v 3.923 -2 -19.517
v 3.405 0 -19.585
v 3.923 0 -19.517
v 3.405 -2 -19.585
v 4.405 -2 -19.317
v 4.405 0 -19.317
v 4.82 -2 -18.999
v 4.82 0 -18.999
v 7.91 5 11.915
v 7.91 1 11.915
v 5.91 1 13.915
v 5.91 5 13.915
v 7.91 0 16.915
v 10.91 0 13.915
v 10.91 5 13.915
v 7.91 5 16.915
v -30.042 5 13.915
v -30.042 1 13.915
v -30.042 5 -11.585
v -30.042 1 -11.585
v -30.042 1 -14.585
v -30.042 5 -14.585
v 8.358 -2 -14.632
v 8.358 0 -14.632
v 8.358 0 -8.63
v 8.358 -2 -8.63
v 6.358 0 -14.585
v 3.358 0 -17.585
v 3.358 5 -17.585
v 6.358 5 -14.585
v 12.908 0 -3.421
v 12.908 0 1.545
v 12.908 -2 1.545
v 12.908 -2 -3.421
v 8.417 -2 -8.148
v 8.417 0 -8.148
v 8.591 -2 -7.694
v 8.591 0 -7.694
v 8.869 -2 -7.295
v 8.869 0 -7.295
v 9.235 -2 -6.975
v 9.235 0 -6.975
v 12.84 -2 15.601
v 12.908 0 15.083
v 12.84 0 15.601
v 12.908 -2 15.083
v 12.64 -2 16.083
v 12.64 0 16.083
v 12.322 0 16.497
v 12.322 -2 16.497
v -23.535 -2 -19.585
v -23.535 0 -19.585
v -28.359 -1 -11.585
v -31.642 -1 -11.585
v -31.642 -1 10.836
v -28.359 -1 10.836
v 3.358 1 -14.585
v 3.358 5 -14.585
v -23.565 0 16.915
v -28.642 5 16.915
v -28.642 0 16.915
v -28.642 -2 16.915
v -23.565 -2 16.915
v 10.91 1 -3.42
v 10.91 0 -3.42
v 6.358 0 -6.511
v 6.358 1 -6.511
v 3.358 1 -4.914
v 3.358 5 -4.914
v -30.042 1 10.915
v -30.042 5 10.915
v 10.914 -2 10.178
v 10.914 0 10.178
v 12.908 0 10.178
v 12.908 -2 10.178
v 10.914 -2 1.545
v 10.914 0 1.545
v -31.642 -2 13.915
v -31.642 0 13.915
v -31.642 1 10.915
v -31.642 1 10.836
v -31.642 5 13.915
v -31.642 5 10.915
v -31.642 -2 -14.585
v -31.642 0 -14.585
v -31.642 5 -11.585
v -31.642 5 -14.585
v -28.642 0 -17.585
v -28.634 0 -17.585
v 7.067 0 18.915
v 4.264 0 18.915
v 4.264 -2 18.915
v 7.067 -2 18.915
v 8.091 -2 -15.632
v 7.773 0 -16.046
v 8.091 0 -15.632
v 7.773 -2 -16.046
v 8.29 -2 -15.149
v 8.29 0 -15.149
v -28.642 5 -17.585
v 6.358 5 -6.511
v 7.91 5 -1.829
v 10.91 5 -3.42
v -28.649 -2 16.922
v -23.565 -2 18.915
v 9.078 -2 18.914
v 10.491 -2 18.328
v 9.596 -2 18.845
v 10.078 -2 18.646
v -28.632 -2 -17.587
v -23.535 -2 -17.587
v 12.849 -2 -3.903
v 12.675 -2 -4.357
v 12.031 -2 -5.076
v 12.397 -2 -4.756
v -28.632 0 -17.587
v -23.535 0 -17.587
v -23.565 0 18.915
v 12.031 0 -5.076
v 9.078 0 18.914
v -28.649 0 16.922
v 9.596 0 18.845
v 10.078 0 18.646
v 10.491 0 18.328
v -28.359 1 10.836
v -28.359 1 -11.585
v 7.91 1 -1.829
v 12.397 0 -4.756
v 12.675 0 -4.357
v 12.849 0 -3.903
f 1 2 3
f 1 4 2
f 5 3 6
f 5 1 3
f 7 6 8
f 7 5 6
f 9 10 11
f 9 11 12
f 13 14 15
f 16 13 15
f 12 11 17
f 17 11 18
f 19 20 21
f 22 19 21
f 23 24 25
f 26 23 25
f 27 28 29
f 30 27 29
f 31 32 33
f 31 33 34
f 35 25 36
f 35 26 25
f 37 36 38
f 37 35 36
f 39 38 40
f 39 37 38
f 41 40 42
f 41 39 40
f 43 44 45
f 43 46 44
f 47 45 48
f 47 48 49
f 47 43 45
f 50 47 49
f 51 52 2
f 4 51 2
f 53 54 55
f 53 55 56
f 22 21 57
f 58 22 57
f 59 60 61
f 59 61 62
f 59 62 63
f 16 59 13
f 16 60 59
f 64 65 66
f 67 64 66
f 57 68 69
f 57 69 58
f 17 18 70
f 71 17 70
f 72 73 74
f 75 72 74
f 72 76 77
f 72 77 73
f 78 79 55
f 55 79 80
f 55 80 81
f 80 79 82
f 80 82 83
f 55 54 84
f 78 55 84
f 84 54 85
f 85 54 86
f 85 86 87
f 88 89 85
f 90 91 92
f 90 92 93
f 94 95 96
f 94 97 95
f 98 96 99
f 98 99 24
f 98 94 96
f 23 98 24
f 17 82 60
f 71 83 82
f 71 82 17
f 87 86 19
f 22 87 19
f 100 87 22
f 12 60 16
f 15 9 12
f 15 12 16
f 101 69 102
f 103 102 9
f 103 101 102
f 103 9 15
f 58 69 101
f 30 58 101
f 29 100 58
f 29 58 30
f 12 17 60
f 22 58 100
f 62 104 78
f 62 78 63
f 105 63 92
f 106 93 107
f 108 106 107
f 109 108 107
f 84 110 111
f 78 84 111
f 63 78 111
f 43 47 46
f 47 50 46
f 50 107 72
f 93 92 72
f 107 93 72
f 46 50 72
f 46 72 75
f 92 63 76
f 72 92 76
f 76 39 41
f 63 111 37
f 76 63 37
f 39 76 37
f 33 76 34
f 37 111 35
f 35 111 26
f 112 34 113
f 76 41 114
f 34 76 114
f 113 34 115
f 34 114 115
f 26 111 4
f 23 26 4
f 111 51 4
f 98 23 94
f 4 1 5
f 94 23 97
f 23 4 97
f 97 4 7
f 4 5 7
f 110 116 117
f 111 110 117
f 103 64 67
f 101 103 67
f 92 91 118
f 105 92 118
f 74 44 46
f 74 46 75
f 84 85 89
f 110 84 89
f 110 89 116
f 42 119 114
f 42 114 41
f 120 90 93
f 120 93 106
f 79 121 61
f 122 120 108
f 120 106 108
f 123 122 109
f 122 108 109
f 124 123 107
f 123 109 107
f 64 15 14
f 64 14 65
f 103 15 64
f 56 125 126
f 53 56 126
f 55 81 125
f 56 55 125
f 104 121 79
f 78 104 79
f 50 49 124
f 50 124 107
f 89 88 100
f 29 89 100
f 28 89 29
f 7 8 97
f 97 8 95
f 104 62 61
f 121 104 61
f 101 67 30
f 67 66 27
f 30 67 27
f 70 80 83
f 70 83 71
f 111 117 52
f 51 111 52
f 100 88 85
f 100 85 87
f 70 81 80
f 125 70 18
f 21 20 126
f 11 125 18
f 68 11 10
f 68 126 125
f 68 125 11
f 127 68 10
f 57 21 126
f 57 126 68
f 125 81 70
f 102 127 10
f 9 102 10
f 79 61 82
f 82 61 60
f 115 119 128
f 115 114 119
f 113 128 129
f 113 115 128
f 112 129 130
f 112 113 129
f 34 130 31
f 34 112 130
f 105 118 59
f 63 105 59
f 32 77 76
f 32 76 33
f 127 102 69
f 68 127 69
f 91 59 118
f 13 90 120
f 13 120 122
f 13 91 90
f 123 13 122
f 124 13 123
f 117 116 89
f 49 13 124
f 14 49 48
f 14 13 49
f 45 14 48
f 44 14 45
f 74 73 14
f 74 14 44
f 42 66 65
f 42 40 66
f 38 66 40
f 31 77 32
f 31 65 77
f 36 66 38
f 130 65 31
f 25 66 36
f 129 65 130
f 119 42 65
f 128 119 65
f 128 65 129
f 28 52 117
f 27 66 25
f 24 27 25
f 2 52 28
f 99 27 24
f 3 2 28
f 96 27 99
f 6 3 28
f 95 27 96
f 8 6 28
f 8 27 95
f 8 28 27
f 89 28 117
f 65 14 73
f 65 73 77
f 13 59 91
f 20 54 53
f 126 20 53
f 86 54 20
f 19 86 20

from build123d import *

# Parameters (mm, degrees)
SKETCH1_W               = 41
SKETCH1_H               = 34.5
SKETCH1_W_2             = 35
SKETCH1_H_2             = 28.5
BOSS_EXTRUDE1_DEPTH     = 5
SKETCH2_W               = 35
SKETCH2_H               = 28.5
BOSS_EXTRUDE2_DEPTH     = 1
SKETCH6_W               = 34.5
SKETCH6_H               = 5
CUT_EXTRUDE2_DEPTH      = 3
SKETCH7_W               = 1.6
SKETCH7_H               = 3
BOSS_EXTRUDE3_DEPTH     = 4
CHAMFER1_SIZE           = 3
SKETCH14_W              = 3.502632447
SKETCH14_H              = 20.452559449
CUT_EXTRUDE6_DEPTH      = 10
BOSS_EXTRUDE5_DEPTH     = 4
BOSS_EXTRUDE7_DEPTH     = 1
SKETCH9_W               = 3.28281374
SKETCH9_H               = 22.420706044
CUT_EXTRUDE3_DEPTH      = 4
BOSS_EXTRUDE4_DEPTH     = 2
SKETCH12_W              = 3.28281374
SKETCH12_H              = 22.420706044
CUT_EXTRUDE4_DEPTH      = 1
BOSS_EXTRUDE8_DEPTH     = 2
BOSS_EXTRUDE9_DEPTH     = 2
CUT_EXTRUDE7_DEPTH      = 1
CUT_EXTRUDE7_DEPTH_BACK = 4
CHAMFER2_SIZE           = 3
CHAMFER2_EDGE_2_SIZE2   = 3
CHAMFER2_EDGE_2_SIZE    = 3.001586398
CHAMFER3_SIZE           = 2
CUT_EXTRUDE8_DEPTH      = 10
SKETCH29_W              = 2.811538377
SKETCH29_H              = 2
CUT_EXTRUDE9_DEPTH      = 10
SKETCH31_W              = 5.26
SKETCH31_H              = 2
CUT_EXTRUDE10_DEPTH     = 10
SKETCH33_W              = 1.99335007
SKETCH33_H              = 8.633384354
CUT_EXTRUDE11_DEPTH     = 10
FILLET1_R               = 2


with BuildPart() as part:
    # Sketch1 → Boss-Extrude1 (new body)
    with BuildSketch(Plane(origin=(0, 0, 0), x_dir=(1, 0, 0), z_dir=(0, 1, 0))):
        with Locations((-14.14154724, 0.334775681)):
            Rectangle(SKETCH1_W, SKETCH1_H)
        with Locations((-14.14154724, 0.334775681)):
            Rectangle(SKETCH1_W_2, SKETCH1_H_2, mode=Mode.SUBTRACT)
    extrude(amount=BOSS_EXTRUDE1_DEPTH)

    # Sketch2 → Boss-Extrude2 (add)
    with BuildSketch(Plane(origin=(0, 0, 0), x_dir=(1, 0, 0), z_dir=(0, 1, 0))):
        with Locations((-14.14154724, 0.334775681)):
            Rectangle(SKETCH2_W, SKETCH2_H)
    extrude(amount=BOSS_EXTRUDE2_DEPTH)

    # Sketch6 → Cut-Extrude2 (cut)
    with BuildSketch(Plane.ZY.offset(34.64154724)):
        with Locations((-0.334775681, 2.5)):
            Rectangle(SKETCH6_W, SKETCH6_H)
    extrude(amount=-CUT_EXTRUDE2_DEPTH, mode=Mode.SUBTRACT)

    # Sketch7 → Boss-Extrude3 (add)
    with BuildSketch(Plane(origin=(0, 1, 0), x_dir=(1, 0, 0), z_dir=(0, 1, 0))):
        with Locations((-30.84154724, 13.084775681)):
            Rectangle(SKETCH7_W, SKETCH7_H)
        with Locations((-30.84154724, -12.415224319)):
            Rectangle(SKETCH7_W, SKETCH7_H)
    extrude(amount=BOSS_EXTRUDE3_DEPTH)

    # Chamfer1
    chamfer1_edges = [part.edges().sort_by_distance(p)[0] for p in [
        (-31.64154724, 2.5, -17.584775681),
        (-31.64154724, 2.5, 16.915224319),
        (6.35845276, 2.5, -17.584775681),
        (6.35845276, 2.5, 16.915224319),
    ]]
    chamfer(chamfer1_edges, length=CHAMFER1_SIZE)

    # Sketch14 → Cut-Extrude6 (cut)
    with BuildSketch(Plane(origin=(0, 1, 0), x_dir=(1, 0, 0), z_dir=(0, 1, 0))):
        with Locations((5.109768984, -7.134544415)):
            Rectangle(SKETCH14_W, SKETCH14_H)
    extrude(amount=CUT_EXTRUDE6_DEPTH, mode=Mode.SUBTRACT)

    # Sketch17 → Boss-Extrude5 (add)
    with BuildSketch(Plane(origin=(0, 1, 0), x_dir=(1, 0, 0), z_dir=(0, 1, 0))):
        Polygon((3.35845276, 3.09173531), (7.910000942, 0), (7.910000942, -13.915224319), (3.35845276, -13.915224319), (3.35845276, -16.915224319), (10.910000942, -16.915224319), (10.910000942, 3.419581668), (3.35845276, 8.549130391), align=None)
    extrude(amount=BOSS_EXTRUDE5_DEPTH)

    # Sketch19 → Boss-Extrude7 (add)
    with BuildSketch(Plane.XZ):
        Polygon((3.35845276, 16.915224319), (10.910000942, 16.915224319), (10.910000942, -3.419581668), (6.35845276, -6.511316978), (6.35845276, 13.915224319), align=None)
    extrude(amount=-BOSS_EXTRUDE7_DEPTH)

    # Sketch9 → Cut-Extrude3 (cut)
    with BuildSketch(Plane(origin=(0, 1, 0), x_dir=(1, 0, 0), z_dir=(0, 1, 0))):
        with Locations((-30.00014037, 0.374422659)):
            Rectangle(SKETCH9_W, SKETCH9_H)
    extrude(amount=-CUT_EXTRUDE3_DEPTH, mode=Mode.SUBTRACT)

    # Sketch11 → Boss-Extrude4 (add)
    with BuildSketch(Plane.XZ):
        Polygon((-26.665503706, 18.915224319), (-31.64154724, 13.915224319), (-31.64154724, -14.584775681), (-26.629189212, -19.584775681), (4.233785533, -19.584775681), (8.35845276, -15.460108453), (8.35845276, 14.743651444), (4.263960312, 18.915224319), align=None)
    extrude(amount=BOSS_EXTRUDE4_DEPTH)

    # Sketch12 → Cut-Extrude4 (cut)
    with BuildSketch(Plane(origin=(0, 0, 0), x_dir=(1, 0, 0), z_dir=(0, 1, 0))):
        with Locations((-30.00014037, 0.374422659)):
            Rectangle(SKETCH12_W, SKETCH12_H)
    extrude(amount=-CUT_EXTRUDE4_DEPTH, mode=Mode.SUBTRACT)

    # Sketch20 → Boss-Extrude8 (add)
    with BuildSketch(Plane.XZ):
        Polygon((6.227005221, 16.915224319), (10.910000942, 16.915224319), (10.910000942, -3.419581668), (8.35845276, -5.152774704), (8.35845276, 14.743651444), align=None)
    extrude(amount=BOSS_EXTRUDE8_DEPTH)

    # Sketch21 → Boss-Extrude9 (add)
    with BuildSketch(Plane(origin=(0, 0, 0), x_dir=(1, 0, 0), z_dir=(0, 1, 0))):
        Polygon((8.35845276, 7.570549944), (8.35845276, 5.152774704), (10.90766939, 3.421165424), (10.90766939, -16.912751148), (6.227005221, -16.915224319), (4.263960312, -18.915224319), (7.06681334, -18.91478086), (12.90766939, -18.911694666), (12.90766939, 4.480398389), align=None)
    extrude(amount=-BOSS_EXTRUDE9_DEPTH)

    # Sketch23 → Cut-Extrude7 (cut, two sides)
    with BuildSketch(Plane(origin=(0, 5, 0), x_dir=(1, 0, 0), z_dir=(0, 1, 0))) as cut_extrude7_sk:
        Polygon((7.910000942, 0), (7.910000942, 1.828776855), (3.35845276, 4.913740582), (3.35845276, 3.09173531), align=None)
    extrude(amount=CUT_EXTRUDE7_DEPTH, mode=Mode.SUBTRACT)
    extrude(cut_extrude7_sk.sketch, amount=-CUT_EXTRUDE7_DEPTH_BACK, mode=Mode.SUBTRACT)

    # Chamfer2
    chamfer2_edges = [part.edges().sort_by_distance(p)[0] for p in [
        (10.910000942, 2.5, 16.915224319),
    ]]
    chamfer(chamfer2_edges, length=CHAMFER2_SIZE)

    # Chamfer2 edge 2
    chamfer2_edge_2_edges = [part.edges().sort_by_distance(p)[0] for p in [
        (12.90766939, -1, 18.911694666),
    ]]
    chamfer(chamfer2_edge_2_edges, length=CHAMFER2_EDGE_2_SIZE, length2=CHAMFER2_EDGE_2_SIZE2)

    # Chamfer3
    chamfer3_edges = [part.edges().sort_by_distance(p)[0] for p in [
        (7.910000942, 3, 13.915224319),
    ]]
    chamfer(chamfer3_edges, length=CHAMFER3_SIZE)

    # Sketch27 → Cut-Extrude8 (cut)
    with BuildSketch(Plane(origin=(0, 0, 0), x_dir=(1, 0, 0), z_dir=(0, 1, 0))):
        Polygon((-23.564566169, -18.915224319), (-23.564566169, -16.956730787), (-23.564566169, -16.915224319), (-28.64154724, -16.915224319), (-26.665503706, -18.915224319), align=None)
    extrude(amount=-CUT_EXTRUDE8_DEPTH, mode=Mode.SUBTRACT)

    # Sketch29 → Cut-Extrude9 (cut)
    with BuildSketch(Plane(origin=(-22.95033658, 0, 22.675432092), x_dir=(-0.702833562, 0, -0.711354331), z_dir=(0.711354331, 0, -0.702833562))):
        with Locations((6.691753419, -1)):
            Rectangle(SKETCH29_W, SKETCH29_H)
    extrude(amount=-CUT_EXTRUDE9_DEPTH, mode=Mode.SUBTRACT)

    # Sketch31 → Cut-Extrude10 (cut)
    with BuildSketch(Plane(origin=(0, 0, 0), x_dir=(1, 0, 0), z_dir=(0, 1, 0))):
        with Locations((-26.164712617, 18.586994213)):
            Rectangle(SKETCH31_W, SKETCH31_H)
    extrude(amount=-CUT_EXTRUDE10_DEPTH, mode=Mode.SUBTRACT)

    # Sketch33 → Cut-Extrude11 (cut)
    with BuildSketch(Plane.XZ.offset(2)):
        with Locations((11.910994355, 5.861564698)):
            Rectangle(SKETCH33_W, SKETCH33_H)
    extrude(amount=-CUT_EXTRUDE11_DEPTH, mode=Mode.SUBTRACT)

    # Fillet1
    fillet1_edges = [part.edges().sort_by_distance(p)[0] for p in [
        (4.233785533, -1, -19.584775681),
        (8.35845276, -1, -15.460108453),
        (8.35845276, -1, -7.570549944),
        (12.90766939, -1, -4.480398389),
        (9.906083411, -1, 18.913280645),
        (12.90766939, -1, 15.911694666),
    ]]
    fillet(fillet1_edges, radius=FILLET1_R)


solid = part.part
